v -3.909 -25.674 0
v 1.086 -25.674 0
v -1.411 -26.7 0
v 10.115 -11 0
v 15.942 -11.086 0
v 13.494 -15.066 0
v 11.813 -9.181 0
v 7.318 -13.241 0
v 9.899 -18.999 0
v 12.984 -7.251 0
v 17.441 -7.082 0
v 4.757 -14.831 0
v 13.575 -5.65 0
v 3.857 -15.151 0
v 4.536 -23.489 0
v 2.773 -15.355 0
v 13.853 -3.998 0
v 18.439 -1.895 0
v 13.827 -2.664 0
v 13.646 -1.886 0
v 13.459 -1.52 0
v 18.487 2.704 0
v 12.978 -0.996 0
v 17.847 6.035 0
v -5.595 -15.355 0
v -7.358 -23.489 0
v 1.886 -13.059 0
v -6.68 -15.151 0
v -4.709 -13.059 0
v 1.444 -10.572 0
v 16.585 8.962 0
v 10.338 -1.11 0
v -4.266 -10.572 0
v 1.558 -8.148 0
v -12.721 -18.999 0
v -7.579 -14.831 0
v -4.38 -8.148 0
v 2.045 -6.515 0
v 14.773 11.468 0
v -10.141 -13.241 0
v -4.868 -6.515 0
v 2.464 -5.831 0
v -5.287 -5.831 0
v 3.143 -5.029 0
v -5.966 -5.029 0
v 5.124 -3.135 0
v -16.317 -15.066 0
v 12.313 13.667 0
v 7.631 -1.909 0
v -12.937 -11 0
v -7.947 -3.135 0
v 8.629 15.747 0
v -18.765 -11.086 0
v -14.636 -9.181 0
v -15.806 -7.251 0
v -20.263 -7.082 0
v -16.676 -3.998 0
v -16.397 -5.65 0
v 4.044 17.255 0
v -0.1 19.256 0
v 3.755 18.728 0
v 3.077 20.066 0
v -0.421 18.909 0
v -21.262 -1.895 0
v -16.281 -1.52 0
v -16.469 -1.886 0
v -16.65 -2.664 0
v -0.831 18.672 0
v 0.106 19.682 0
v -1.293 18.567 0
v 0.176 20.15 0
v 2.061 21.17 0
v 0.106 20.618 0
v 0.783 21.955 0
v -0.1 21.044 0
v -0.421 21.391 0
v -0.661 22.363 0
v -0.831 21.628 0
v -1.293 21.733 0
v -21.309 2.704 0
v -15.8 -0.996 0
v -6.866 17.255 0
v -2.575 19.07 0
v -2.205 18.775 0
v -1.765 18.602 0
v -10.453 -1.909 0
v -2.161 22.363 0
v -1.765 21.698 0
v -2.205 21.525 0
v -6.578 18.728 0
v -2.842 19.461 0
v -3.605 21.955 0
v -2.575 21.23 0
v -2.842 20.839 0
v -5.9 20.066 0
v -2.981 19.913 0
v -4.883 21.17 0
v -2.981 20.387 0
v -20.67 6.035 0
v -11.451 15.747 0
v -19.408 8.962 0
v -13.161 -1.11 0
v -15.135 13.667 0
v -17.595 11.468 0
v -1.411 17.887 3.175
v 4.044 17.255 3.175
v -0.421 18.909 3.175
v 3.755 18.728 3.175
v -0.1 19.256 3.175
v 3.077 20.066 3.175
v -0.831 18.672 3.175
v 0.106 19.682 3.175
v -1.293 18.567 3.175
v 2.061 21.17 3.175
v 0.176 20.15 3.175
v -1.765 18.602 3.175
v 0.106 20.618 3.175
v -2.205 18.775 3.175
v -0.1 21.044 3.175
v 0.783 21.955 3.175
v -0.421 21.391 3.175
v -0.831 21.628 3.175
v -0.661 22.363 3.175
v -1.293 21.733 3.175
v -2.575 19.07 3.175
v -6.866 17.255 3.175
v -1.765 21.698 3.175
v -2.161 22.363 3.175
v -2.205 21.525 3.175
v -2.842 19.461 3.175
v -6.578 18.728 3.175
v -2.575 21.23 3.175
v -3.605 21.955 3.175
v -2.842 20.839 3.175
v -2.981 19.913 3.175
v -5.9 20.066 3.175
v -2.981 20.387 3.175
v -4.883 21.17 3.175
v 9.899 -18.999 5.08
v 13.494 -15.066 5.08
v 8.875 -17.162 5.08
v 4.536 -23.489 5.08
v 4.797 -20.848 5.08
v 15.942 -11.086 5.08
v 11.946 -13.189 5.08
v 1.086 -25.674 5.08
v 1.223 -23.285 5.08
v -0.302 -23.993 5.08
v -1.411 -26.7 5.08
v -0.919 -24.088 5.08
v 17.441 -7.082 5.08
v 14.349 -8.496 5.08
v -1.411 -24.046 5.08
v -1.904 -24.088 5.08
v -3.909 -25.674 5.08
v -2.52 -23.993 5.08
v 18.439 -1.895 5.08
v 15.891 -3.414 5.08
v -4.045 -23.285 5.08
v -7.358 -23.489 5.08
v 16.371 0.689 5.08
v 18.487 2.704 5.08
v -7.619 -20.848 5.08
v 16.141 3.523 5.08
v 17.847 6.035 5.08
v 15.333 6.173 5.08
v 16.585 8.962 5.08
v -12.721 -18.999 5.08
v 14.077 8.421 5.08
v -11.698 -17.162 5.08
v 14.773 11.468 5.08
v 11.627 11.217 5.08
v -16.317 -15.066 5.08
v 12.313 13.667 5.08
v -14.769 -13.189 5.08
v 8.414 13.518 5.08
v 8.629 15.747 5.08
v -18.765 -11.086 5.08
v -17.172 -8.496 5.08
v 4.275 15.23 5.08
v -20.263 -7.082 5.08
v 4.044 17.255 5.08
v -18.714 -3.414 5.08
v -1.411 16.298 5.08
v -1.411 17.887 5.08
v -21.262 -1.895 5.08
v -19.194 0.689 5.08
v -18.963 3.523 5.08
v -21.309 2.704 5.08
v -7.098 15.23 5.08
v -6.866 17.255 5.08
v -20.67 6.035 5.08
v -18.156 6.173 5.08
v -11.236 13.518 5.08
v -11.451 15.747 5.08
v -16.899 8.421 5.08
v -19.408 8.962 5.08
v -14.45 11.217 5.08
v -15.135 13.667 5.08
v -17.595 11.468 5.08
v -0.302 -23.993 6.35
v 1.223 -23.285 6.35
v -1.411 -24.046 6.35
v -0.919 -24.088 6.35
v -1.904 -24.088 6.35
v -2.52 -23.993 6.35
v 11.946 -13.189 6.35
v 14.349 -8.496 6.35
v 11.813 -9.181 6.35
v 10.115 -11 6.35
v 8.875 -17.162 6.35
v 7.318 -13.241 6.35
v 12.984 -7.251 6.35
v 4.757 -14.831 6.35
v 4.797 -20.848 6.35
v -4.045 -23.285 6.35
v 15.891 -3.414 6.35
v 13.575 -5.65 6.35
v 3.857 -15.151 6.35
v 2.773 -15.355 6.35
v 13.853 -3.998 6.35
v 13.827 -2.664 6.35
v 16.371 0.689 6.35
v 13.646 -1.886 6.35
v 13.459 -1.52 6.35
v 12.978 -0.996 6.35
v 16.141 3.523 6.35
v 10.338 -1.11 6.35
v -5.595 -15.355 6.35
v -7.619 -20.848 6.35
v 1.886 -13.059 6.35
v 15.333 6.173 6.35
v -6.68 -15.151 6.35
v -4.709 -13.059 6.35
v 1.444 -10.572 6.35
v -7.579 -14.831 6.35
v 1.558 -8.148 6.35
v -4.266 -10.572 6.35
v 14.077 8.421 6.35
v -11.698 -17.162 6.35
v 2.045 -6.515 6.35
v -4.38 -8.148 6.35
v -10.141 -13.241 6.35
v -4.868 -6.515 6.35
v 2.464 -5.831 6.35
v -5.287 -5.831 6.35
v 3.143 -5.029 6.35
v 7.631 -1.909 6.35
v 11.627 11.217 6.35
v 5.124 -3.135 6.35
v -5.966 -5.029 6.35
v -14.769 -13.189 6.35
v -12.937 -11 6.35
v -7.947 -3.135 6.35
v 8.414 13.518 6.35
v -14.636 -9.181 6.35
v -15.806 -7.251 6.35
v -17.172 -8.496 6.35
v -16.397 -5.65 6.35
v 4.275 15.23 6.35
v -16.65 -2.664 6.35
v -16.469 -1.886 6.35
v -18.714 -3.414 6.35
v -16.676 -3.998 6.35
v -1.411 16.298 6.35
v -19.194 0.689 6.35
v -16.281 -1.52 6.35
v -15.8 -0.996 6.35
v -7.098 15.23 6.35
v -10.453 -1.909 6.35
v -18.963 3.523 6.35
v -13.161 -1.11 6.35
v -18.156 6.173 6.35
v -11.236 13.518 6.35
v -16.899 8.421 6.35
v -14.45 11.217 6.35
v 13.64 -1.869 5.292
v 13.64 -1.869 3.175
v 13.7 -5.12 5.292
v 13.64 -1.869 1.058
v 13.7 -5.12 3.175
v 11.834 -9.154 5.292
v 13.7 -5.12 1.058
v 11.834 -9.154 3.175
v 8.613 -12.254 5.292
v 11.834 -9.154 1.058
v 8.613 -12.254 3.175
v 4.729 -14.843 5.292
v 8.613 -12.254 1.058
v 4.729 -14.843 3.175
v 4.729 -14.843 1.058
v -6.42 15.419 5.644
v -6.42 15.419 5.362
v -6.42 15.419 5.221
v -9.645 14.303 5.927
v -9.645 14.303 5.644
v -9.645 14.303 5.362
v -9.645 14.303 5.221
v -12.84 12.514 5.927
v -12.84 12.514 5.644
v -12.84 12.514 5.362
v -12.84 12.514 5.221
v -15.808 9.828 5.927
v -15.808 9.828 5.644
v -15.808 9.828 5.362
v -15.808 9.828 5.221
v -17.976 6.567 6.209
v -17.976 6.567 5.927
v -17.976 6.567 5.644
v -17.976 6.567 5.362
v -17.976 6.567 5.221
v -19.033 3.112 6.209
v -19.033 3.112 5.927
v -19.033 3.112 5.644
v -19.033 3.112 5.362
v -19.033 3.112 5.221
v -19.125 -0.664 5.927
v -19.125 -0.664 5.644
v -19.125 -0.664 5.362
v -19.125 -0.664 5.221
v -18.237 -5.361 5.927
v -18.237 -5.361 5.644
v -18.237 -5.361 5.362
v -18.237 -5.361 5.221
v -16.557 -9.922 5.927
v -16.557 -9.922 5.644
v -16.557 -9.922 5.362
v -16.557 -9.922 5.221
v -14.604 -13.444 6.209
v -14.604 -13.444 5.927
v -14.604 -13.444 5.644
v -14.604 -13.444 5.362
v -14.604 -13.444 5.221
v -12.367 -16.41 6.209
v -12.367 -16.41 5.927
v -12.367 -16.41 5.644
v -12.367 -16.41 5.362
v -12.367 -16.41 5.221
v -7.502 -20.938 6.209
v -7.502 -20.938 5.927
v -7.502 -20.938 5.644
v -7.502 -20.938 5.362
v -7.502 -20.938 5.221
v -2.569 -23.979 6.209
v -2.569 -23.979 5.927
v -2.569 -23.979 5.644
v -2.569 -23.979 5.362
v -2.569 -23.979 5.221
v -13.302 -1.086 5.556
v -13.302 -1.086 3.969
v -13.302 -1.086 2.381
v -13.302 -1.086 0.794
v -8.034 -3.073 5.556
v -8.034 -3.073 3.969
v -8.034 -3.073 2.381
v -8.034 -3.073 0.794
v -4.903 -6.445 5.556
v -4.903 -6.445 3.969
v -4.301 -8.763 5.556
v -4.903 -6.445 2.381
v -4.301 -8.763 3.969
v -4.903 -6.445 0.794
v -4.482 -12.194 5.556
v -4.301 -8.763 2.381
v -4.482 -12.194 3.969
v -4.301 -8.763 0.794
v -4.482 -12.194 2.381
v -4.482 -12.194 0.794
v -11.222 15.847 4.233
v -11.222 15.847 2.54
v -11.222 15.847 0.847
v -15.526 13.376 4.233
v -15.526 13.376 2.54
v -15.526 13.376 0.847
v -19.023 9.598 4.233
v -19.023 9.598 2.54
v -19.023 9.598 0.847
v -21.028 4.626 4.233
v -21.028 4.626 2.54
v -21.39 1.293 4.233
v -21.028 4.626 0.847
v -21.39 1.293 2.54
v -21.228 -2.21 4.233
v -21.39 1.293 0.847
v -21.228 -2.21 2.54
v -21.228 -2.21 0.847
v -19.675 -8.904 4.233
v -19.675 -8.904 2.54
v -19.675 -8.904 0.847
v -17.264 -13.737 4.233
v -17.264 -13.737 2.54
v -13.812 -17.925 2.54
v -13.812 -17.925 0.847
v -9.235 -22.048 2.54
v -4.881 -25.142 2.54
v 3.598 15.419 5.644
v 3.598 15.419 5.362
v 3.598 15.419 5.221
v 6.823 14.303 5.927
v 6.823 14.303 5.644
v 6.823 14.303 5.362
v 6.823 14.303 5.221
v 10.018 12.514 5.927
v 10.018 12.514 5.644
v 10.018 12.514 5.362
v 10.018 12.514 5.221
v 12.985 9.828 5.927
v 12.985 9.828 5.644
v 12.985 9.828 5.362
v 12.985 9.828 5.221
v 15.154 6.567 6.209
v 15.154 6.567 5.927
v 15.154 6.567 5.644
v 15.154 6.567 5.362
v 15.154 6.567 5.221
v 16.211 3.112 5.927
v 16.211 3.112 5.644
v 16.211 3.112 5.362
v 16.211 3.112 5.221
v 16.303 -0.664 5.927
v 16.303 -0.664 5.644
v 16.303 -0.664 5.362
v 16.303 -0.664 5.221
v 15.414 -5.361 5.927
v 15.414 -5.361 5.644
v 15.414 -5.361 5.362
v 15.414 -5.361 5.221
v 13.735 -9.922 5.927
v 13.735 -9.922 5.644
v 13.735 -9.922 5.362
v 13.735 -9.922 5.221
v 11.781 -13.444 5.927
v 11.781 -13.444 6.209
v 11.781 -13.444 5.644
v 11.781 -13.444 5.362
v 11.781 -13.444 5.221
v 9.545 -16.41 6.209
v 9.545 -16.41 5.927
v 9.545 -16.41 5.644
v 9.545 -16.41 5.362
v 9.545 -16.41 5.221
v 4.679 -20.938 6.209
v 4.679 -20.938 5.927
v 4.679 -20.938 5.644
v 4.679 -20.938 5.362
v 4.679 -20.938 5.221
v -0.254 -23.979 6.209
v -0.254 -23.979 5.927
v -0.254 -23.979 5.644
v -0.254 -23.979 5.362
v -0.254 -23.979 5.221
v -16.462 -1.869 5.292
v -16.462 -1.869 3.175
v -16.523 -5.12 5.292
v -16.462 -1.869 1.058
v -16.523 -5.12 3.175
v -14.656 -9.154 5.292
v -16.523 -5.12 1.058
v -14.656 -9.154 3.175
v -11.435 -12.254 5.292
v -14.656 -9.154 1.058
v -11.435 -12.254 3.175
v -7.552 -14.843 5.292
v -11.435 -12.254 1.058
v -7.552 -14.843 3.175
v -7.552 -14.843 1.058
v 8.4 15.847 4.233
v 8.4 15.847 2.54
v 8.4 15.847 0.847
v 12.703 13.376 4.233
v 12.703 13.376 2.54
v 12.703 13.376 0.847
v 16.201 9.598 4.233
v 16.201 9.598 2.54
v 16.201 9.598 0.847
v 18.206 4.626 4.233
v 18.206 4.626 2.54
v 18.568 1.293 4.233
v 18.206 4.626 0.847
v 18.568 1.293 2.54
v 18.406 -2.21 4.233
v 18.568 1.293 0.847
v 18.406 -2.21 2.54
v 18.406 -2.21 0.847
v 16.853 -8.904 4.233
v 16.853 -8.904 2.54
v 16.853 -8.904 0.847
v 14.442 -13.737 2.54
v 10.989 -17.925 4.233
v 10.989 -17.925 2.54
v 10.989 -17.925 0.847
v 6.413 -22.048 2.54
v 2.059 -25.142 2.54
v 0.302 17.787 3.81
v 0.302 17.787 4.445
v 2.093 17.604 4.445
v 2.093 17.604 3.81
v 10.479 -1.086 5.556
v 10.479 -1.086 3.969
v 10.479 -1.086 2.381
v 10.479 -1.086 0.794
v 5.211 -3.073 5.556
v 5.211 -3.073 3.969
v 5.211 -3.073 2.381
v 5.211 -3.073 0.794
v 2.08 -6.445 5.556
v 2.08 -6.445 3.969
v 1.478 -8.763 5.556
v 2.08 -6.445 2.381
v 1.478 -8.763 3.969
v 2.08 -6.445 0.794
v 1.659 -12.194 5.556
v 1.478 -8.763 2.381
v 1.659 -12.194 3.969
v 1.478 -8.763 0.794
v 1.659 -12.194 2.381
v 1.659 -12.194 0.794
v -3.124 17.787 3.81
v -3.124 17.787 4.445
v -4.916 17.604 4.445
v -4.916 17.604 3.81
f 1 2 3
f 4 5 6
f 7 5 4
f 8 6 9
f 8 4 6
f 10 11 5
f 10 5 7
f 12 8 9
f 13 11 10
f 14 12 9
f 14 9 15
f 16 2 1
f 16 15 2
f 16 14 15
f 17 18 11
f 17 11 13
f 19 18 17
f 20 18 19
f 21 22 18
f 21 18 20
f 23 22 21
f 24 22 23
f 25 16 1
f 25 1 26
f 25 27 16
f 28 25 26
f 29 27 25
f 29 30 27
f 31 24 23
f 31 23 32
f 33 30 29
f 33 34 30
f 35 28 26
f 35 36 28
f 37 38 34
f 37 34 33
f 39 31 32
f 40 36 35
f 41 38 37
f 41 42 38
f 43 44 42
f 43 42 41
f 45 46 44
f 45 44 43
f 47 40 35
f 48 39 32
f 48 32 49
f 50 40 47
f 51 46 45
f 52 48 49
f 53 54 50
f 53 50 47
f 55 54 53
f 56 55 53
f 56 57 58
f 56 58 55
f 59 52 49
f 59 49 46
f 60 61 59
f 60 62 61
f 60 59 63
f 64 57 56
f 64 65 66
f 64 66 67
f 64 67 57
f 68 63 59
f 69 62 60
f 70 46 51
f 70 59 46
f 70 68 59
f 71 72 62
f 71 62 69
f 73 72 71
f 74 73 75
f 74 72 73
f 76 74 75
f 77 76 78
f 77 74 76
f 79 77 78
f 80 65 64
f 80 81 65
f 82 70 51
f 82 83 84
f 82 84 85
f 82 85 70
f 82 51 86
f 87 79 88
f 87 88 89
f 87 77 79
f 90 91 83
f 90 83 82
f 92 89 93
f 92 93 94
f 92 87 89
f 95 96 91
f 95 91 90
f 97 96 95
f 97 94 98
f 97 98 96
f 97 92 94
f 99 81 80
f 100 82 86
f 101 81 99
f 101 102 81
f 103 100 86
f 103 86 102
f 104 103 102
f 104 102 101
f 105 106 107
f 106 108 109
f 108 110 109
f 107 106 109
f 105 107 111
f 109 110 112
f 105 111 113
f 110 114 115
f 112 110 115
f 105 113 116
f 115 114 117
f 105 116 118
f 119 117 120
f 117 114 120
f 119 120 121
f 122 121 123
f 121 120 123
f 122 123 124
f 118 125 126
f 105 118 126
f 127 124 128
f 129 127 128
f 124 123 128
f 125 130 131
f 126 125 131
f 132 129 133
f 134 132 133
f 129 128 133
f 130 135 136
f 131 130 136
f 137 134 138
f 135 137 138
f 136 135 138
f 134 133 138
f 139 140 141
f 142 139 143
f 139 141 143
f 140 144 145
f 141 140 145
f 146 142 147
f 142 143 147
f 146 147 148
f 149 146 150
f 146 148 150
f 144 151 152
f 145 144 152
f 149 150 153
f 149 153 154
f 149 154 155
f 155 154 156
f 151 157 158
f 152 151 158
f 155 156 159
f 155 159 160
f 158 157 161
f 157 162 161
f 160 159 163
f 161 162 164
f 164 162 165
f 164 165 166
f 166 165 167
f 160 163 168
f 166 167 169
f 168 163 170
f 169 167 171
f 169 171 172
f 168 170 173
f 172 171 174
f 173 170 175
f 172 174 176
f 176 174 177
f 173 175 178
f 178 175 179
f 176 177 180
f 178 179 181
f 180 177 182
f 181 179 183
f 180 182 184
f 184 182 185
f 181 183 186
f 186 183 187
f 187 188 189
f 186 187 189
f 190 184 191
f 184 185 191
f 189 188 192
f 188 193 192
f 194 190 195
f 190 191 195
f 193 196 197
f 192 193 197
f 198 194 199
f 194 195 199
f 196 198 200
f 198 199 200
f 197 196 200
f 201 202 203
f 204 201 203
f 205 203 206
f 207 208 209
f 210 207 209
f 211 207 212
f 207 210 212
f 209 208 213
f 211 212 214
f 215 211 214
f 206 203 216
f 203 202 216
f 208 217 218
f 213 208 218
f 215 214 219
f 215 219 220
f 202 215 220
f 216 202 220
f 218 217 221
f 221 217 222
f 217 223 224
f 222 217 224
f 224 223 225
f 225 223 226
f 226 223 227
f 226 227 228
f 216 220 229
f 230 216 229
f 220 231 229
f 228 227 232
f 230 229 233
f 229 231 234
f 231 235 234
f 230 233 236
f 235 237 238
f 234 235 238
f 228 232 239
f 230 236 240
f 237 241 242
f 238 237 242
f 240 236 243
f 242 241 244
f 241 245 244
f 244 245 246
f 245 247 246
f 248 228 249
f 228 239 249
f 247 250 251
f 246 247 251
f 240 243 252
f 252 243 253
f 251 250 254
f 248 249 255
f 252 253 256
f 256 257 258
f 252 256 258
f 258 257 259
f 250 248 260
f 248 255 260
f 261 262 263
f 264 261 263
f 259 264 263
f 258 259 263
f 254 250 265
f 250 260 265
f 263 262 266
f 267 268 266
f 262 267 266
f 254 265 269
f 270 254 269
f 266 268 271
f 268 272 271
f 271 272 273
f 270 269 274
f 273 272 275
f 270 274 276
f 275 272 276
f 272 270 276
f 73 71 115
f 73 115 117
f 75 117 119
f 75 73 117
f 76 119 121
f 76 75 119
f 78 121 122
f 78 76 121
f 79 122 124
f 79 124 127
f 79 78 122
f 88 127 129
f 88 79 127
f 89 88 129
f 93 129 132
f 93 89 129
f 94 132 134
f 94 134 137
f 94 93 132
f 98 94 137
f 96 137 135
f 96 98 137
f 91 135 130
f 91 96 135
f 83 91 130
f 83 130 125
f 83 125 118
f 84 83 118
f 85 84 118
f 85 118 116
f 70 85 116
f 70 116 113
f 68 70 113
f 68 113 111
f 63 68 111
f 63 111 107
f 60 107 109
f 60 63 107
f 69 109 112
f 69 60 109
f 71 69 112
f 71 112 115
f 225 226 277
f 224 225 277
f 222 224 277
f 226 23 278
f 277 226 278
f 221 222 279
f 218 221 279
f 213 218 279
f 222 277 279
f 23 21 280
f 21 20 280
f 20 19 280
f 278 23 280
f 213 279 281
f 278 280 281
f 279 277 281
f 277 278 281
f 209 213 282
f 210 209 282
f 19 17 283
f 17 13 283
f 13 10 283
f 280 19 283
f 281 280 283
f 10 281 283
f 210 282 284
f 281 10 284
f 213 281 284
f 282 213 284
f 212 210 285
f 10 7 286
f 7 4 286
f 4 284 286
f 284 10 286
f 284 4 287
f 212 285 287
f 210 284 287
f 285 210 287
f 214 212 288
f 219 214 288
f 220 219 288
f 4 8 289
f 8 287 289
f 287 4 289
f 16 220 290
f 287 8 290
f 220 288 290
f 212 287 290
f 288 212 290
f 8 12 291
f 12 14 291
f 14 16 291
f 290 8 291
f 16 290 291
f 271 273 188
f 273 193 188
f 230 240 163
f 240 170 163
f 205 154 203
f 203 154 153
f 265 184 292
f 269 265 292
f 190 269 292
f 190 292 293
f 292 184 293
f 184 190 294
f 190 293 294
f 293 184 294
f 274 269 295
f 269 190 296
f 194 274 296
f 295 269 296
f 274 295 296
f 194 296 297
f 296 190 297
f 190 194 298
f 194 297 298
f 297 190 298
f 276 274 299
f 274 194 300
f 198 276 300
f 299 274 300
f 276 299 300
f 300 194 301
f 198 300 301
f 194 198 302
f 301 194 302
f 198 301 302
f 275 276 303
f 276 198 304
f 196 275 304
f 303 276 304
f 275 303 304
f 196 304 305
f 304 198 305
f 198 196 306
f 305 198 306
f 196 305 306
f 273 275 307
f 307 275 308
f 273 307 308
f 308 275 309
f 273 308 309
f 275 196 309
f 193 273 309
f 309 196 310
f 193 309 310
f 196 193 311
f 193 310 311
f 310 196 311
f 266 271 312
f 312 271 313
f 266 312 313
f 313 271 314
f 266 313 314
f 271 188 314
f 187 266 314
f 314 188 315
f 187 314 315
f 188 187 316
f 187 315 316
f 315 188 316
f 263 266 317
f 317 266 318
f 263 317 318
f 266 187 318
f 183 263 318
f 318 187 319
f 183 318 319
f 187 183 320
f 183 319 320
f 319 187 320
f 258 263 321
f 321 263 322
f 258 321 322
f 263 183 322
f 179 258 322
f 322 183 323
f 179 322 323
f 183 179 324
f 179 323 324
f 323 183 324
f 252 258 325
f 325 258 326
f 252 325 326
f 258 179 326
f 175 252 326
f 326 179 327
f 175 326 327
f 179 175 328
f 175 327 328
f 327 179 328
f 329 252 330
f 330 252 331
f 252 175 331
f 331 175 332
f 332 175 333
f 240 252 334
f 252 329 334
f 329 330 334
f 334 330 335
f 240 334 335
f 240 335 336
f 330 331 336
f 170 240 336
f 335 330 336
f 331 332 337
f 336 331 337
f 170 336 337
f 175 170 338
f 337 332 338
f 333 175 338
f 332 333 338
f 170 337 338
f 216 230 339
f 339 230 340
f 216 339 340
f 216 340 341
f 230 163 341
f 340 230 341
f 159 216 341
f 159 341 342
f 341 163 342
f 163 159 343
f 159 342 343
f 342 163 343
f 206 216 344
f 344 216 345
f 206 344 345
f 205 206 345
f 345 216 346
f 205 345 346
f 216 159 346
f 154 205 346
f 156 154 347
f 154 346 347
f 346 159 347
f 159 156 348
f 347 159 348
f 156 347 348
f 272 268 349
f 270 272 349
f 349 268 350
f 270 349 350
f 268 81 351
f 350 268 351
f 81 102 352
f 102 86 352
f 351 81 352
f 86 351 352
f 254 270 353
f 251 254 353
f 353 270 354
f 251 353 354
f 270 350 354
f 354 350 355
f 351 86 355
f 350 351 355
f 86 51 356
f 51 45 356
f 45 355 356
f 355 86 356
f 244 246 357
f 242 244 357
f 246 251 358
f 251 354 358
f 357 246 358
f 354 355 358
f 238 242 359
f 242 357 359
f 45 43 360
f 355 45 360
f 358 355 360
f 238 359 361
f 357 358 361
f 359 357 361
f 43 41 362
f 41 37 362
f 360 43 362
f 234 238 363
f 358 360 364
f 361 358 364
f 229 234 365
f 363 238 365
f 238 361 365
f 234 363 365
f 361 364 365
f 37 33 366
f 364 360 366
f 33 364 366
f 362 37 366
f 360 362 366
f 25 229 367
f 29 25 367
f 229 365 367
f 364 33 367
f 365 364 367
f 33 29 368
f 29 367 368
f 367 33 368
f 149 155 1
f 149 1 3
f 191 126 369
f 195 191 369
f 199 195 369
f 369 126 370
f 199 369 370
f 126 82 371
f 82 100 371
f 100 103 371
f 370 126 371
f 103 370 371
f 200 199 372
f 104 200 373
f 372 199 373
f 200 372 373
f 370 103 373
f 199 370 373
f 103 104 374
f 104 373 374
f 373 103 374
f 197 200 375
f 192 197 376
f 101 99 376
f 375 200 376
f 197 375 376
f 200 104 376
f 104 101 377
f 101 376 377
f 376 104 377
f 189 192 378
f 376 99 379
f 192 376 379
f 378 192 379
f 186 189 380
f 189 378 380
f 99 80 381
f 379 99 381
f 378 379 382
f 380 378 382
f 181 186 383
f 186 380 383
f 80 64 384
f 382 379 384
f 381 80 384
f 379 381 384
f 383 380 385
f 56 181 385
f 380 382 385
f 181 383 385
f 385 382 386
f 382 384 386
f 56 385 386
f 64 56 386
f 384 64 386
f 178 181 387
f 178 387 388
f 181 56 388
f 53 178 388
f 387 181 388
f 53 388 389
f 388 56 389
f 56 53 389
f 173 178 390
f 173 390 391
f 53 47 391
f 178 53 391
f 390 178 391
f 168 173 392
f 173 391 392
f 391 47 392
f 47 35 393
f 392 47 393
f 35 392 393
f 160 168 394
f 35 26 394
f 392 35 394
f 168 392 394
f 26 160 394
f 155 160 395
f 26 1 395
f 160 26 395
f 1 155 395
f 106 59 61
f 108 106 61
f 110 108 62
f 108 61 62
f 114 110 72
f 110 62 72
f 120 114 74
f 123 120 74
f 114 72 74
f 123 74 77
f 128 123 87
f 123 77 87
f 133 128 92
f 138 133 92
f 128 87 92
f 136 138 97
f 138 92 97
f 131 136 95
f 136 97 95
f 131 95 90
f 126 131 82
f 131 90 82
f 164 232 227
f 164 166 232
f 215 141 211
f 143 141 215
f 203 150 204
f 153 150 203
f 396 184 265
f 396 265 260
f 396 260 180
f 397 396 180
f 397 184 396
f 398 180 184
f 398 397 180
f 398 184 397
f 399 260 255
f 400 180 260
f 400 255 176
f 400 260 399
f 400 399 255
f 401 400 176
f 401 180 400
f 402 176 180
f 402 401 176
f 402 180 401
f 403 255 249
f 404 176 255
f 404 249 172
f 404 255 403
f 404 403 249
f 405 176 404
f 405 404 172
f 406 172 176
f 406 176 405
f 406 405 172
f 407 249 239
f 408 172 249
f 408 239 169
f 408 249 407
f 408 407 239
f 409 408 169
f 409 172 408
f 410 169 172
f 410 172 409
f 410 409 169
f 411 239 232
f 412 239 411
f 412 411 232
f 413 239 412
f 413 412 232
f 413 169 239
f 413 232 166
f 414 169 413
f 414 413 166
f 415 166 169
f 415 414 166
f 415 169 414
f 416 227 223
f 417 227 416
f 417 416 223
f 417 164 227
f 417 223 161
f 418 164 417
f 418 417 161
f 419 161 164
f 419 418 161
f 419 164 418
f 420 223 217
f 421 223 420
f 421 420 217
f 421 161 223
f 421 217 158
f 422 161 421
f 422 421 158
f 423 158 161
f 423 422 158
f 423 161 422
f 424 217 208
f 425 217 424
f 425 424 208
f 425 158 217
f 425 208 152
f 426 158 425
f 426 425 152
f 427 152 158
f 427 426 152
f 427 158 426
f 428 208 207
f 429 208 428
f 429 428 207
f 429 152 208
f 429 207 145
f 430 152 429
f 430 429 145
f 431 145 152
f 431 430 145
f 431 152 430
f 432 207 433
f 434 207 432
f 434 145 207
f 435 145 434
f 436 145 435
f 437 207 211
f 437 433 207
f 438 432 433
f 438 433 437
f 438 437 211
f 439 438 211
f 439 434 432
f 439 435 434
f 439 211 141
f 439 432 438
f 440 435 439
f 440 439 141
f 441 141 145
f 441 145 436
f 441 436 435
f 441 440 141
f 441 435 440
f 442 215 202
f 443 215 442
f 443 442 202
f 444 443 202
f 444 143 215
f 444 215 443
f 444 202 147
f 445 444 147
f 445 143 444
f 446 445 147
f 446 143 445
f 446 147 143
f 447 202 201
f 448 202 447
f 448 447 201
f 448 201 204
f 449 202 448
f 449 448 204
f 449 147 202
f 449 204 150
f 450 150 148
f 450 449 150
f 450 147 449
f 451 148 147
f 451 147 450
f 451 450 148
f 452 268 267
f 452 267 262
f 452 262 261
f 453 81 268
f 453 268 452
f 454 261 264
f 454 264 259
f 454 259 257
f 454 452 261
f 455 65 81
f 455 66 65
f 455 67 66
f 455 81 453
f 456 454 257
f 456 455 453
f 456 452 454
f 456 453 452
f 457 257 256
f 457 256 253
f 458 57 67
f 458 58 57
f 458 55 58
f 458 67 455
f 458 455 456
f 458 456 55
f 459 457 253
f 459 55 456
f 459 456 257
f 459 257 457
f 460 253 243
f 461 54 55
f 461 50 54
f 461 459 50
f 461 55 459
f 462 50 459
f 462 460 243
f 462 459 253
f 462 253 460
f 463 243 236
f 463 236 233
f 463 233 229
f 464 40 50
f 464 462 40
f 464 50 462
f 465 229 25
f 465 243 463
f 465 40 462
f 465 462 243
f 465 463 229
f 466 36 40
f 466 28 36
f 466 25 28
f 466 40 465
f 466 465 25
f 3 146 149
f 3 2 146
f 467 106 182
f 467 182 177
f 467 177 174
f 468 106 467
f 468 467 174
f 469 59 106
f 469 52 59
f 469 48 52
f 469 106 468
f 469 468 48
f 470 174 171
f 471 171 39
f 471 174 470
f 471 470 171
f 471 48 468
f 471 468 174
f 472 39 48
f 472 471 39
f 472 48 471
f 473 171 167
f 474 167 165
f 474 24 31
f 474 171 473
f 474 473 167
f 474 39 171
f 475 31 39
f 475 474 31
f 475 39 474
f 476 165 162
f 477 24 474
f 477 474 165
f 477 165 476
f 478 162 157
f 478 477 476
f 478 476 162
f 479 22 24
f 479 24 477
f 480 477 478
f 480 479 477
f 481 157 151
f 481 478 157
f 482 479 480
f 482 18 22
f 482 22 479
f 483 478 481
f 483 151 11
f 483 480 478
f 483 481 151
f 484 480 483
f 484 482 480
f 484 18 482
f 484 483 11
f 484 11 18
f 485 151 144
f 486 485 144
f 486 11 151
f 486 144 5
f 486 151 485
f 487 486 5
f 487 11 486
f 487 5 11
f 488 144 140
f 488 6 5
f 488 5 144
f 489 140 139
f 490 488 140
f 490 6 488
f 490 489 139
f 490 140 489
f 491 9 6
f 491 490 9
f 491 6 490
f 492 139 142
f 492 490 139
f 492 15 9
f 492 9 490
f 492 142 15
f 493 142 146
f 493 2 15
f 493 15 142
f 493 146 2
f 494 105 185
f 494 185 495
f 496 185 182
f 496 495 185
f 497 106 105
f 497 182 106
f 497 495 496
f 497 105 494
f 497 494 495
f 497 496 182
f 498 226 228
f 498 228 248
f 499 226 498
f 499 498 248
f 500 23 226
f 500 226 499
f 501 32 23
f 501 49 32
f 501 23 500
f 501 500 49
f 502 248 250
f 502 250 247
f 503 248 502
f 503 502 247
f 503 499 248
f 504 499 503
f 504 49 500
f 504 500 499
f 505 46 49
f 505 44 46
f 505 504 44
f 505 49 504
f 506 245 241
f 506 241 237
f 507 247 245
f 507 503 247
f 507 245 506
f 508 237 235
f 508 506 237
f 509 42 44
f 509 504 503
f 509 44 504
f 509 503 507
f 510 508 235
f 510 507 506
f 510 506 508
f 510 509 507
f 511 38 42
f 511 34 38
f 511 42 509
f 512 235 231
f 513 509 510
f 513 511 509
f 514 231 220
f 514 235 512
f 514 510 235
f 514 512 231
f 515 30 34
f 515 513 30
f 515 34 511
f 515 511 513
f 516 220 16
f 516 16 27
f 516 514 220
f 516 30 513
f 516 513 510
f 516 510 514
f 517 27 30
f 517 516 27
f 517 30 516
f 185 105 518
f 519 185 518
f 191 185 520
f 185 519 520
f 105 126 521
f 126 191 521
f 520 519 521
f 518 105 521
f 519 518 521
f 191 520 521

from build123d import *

# Parameters (mm, degrees)
F1_DEPTH = 6.35
F2_DEPTH = 5.08
F0_R     = 1.5875
F3_DEPTH = 3.175


with BuildPart() as f1:
    # F0 (on Top) → F1 (new body)
    with BuildSketch(Plane.XY):
        with BuildLine():
            add(Edge.make_bspline(
                [(-1.4112541221, 16.2979830056), (0.2083424352, 16.0920060725), (3.7344260135, 15.6435660717), (10.3937440091, 12.9987411213), (15.8767636121, 6.809953331), (16.9010208319, -0.7390129398), (14.1684728151, -10.1079118181), (9.7602130959, -16.5667305177), (5.1170487603, -20.8255933605), (-0.0347118095, -24.2343912546), (-1.0862832675, -24.0906685498), (-1.4112541221, -24.046253413)],
                knots=[0, 0, 0, 0, 0.1008585296, 0.2195828357, 0.3449507761, 0.4659662279, 0.6045939254, 0.7288816073, 0.8441824902, 0.9518471627, 1, 1, 1, 1], degree=3))
            add(Edge.make_bspline(
                [(-1.4112541221, 16.2979830056), (-3.0308506794, 16.0920060725), (-6.5569342578, 15.6435660717), (-13.2162522534, 12.9987411213), (-18.6992718563, 6.809953331), (-19.7235290761, -0.7390129398), (-16.9909810594, -10.1079118181), (-12.5827213401, -16.5667305177), (-7.9395570045, -20.8255933605), (-2.7877964348, -24.2343912546), (-1.7362249768, -24.0906685498), (-1.4112541221, -24.046253413)],
                knots=[0, 0, 0, 0, 0.1008585296, 0.2195828357, 0.3449507761, 0.4659662279, 0.6045939254, 0.7288816073, 0.8441824902, 0.9518471627, 1, 1, 1, 1], degree=3))
        make_face()
        with BuildLine():
            add(Edge.make_bspline(
                [(-15.8001296222, -0.996046816), (-16.049140794, -1.2236086843), (-16.7271092255, -1.8431783277), (-16.8133281385, -5.3751060277), (-14.8491283954, -9.3940475308), (-11.5864460743, -12.219839107), (-7.7229811363, -15.0411769787), (-6.1999227272, -15.2658485335), (-5.5953129195, -15.355036594)],
                knots=[0, 0, 0, 0, 0.0982418768, 0.2674775216, 0.4653369743, 0.6637792895, 0.8665301752, 1, 1, 1, 1], degree=3))
            add(Edge.make_bspline(
                [(-15.8001296222, -0.996046816), (-14.9750193381, -0.9754494022), (-13.2691200267, -0.9328646535), (-10.5400347103, -1.8514557492), (-7.9507181497, -2.8711457619), (-6.0504051615, -4.9284532505), (-4.7497965253, -6.3730802582), (-4.1599986905, -8.8125502393), (-4.2798956636, -12.2754795554), (-5.1586784304, -14.332820405), (-5.5953129195, -15.355036594)],
                knots=[0, 0, 0, 0, 0.1197822072, 0.2476473614, 0.3744244804, 0.499497881, 0.603656632, 0.7208883853, 0.8613198143, 1, 1, 1, 1], degree=3))
        make_face(mode=Mode.SUBTRACT)
        with BuildLine():
            add(Edge.make_bspline(
                [(12.977621378, -0.996046816), (12.1525110938, -0.9754494022), (10.4466117825, -0.9328646535), (7.717526466, -1.8514557492), (5.1282099054, -2.8711457619), (3.2278969172, -4.9284532505), (1.927288281, -6.3730802582), (1.3374904462, -8.8125502393), (1.4573874194, -12.2754795554), (2.3361701861, -14.332820405), (2.7728046752, -15.355036594)],
                knots=[0, 0, 0, 0, 0.1197822072, 0.2476473614, 0.3744244804, 0.499497881, 0.603656632, 0.7208883853, 0.8613198143, 1, 1, 1, 1], degree=3))
            add(Edge.make_bspline(
                [(12.977621378, -0.996046816), (13.2266325498, -1.2236086843), (13.9046009813, -1.8431783277), (13.9908198943, -5.3751060277), (12.0266201511, -9.3940475308), (8.7639378301, -12.219839107), (4.9004728921, -15.0411769787), (3.3774144829, -15.2658485335), (2.7728046752, -15.355036594)],
                knots=[0, 0, 0, 0, 0.0982418768, 0.2674775216, 0.4653369743, 0.6637792895, 0.8665301752, 1, 1, 1, 1], degree=3))
        make_face(mode=Mode.SUBTRACT)
    extrude(amount=F1_DEPTH)

    # F0 (on Top) → F2 (join)
    with BuildSketch(Plane.XY):
        with BuildLine():
            add(Edge.make_bspline(
                [(-1.4112541221, 17.8868025541), (0.2894761052, 17.8001667692), (1.9870259072, 17.7155284418), (4.0435007304, 17.2553602606)],
                knots=[0, 0, 0, 0, 0.1118784285, 0.1118784285, 0.1118784285, 0.1118784285], degree=3))
            add(Edge.make_bspline(
                [(-1.4112541221, 17.8868025541), (-3.1119843495, 17.8001667692), (-4.8095341515, 17.7155284418), (-6.8660089746, 17.2553602606)],
                knots=[0, 0, 0, 0, 0.1118784285, 0.1118784285, 0.1118784285, 0.1118784285], degree=3))
            add(Edge.make_bspline(
                [(-6.8660089746, 17.2553602606), (-9.5693231743, 16.6504517227), (-16.3616635993, 14.0879956485), (-22.5586290298, 4.9491136437), (-20.4686657879, -9.5081509637), (-14.5770277394, -17.9377178907), (-5.2566268203, -25.3570476989), (-2.4124365336, -26.3447570611), (-1.4112541221, -26.7001313573)],
                knots=[0.1118784285, 0.1118784285, 0.1118784285, 0.1118784285, 0.2589468686, 0.4124431398, 0.5885018887, 0.7451029629, 0.9068800786, 1, 1, 1, 1], degree=3))
            add(Edge.make_bspline(
                [(4.0435007304, 17.2553602606), (6.7468149301, 16.6504517227), (13.539155355, 14.0879956485), (19.7361207856, 4.9491136437), (17.6461575437, -9.5081509637), (11.7545194951, -17.9377178907), (2.4341185761, -25.3570476989), (-0.4100717106, -26.3447570611), (-1.4112541221, -26.7001313573)],
                knots=[0.1118784285, 0.1118784285, 0.1118784285, 0.1118784285, 0.2589468686, 0.4124431398, 0.5885018887, 0.7451029629, 0.9068800786, 1, 1, 1, 1], degree=3))
        make_face()
        with BuildLine():
            add(Edge.make_bspline(
                [(-1.4112541221, 16.2979830056), (-3.0308506794, 16.0920060725), (-6.5569342578, 15.6435660717), (-13.2162522534, 12.9987411213), (-18.6992718563, 6.809953331), (-19.7235290761, -0.7390129398), (-16.9909810594, -10.1079118181), (-12.5827213401, -16.5667305177), (-7.9395570045, -20.8255933605), (-2.7877964348, -24.2343912546), (-1.7362249768, -24.0906685498), (-1.4112541221, -24.046253413)],
                knots=[0, 0, 0, 0, 0.1008585296, 0.2195828357, 0.3449507761, 0.4659662279, 0.6045939254, 0.7288816073, 0.8441824902, 0.9518471627, 1, 1, 1, 1], degree=3))
            add(Edge.make_bspline(
                [(-1.4112541221, 16.2979830056), (0.2083424352, 16.0920060725), (3.7344260135, 15.6435660717), (10.3937440091, 12.9987411213), (15.8767636121, 6.809953331), (16.9010208319, -0.7390129398), (14.1684728151, -10.1079118181), (9.7602130959, -16.5667305177), (5.1170487603, -20.8255933605), (-0.0347118095, -24.2343912546), (-1.0862832675, -24.0906685498), (-1.4112541221, -24.046253413)],
                knots=[0, 0, 0, 0, 0.1008585296, 0.2195828357, 0.3449507761, 0.4659662279, 0.6045939254, 0.7288816073, 0.8441824902, 0.9518471627, 1, 1, 1, 1], degree=3))
        make_face(mode=Mode.SUBTRACT)
    extrude(amount=F2_DEPTH)

    # F0 (on Top) → F3 (join)
    with BuildSketch(Plane.XY):
        with BuildLine():
            add(Edge.make_bspline(
                [(-1.4112541221, 17.8868025541), (-3.1119843495, 17.8001667692), (-4.8095341515, 17.7155284418), (-6.8660089746, 17.2553602606)],
                knots=[0, 0, 0, 0, 0.1118784285, 0.1118784285, 0.1118784285, 0.1118784285], degree=3))
            add(Edge.make_bspline(
                [(-1.4112541221, 17.8868025541), (0.2894761052, 17.8001667692), (1.9870259072, 17.7155284418), (4.0435007304, 17.2553602606)],
                knots=[0, 0, 0, 0, 0.1118784285, 0.1118784285, 0.1118784285, 0.1118784285], degree=3))
            ThreePointArc((4.0435007304, 17.2553602606), (-1.4112541221, 22.4147675889), (-6.8660089746, 17.2553602606))
        make_face()
        with Locations((-1.4112541221, 20.1499480754)):
            Circle(F0_R, mode=Mode.SUBTRACT)
    extrude(amount=F3_DEPTH)


solid = f1.part
